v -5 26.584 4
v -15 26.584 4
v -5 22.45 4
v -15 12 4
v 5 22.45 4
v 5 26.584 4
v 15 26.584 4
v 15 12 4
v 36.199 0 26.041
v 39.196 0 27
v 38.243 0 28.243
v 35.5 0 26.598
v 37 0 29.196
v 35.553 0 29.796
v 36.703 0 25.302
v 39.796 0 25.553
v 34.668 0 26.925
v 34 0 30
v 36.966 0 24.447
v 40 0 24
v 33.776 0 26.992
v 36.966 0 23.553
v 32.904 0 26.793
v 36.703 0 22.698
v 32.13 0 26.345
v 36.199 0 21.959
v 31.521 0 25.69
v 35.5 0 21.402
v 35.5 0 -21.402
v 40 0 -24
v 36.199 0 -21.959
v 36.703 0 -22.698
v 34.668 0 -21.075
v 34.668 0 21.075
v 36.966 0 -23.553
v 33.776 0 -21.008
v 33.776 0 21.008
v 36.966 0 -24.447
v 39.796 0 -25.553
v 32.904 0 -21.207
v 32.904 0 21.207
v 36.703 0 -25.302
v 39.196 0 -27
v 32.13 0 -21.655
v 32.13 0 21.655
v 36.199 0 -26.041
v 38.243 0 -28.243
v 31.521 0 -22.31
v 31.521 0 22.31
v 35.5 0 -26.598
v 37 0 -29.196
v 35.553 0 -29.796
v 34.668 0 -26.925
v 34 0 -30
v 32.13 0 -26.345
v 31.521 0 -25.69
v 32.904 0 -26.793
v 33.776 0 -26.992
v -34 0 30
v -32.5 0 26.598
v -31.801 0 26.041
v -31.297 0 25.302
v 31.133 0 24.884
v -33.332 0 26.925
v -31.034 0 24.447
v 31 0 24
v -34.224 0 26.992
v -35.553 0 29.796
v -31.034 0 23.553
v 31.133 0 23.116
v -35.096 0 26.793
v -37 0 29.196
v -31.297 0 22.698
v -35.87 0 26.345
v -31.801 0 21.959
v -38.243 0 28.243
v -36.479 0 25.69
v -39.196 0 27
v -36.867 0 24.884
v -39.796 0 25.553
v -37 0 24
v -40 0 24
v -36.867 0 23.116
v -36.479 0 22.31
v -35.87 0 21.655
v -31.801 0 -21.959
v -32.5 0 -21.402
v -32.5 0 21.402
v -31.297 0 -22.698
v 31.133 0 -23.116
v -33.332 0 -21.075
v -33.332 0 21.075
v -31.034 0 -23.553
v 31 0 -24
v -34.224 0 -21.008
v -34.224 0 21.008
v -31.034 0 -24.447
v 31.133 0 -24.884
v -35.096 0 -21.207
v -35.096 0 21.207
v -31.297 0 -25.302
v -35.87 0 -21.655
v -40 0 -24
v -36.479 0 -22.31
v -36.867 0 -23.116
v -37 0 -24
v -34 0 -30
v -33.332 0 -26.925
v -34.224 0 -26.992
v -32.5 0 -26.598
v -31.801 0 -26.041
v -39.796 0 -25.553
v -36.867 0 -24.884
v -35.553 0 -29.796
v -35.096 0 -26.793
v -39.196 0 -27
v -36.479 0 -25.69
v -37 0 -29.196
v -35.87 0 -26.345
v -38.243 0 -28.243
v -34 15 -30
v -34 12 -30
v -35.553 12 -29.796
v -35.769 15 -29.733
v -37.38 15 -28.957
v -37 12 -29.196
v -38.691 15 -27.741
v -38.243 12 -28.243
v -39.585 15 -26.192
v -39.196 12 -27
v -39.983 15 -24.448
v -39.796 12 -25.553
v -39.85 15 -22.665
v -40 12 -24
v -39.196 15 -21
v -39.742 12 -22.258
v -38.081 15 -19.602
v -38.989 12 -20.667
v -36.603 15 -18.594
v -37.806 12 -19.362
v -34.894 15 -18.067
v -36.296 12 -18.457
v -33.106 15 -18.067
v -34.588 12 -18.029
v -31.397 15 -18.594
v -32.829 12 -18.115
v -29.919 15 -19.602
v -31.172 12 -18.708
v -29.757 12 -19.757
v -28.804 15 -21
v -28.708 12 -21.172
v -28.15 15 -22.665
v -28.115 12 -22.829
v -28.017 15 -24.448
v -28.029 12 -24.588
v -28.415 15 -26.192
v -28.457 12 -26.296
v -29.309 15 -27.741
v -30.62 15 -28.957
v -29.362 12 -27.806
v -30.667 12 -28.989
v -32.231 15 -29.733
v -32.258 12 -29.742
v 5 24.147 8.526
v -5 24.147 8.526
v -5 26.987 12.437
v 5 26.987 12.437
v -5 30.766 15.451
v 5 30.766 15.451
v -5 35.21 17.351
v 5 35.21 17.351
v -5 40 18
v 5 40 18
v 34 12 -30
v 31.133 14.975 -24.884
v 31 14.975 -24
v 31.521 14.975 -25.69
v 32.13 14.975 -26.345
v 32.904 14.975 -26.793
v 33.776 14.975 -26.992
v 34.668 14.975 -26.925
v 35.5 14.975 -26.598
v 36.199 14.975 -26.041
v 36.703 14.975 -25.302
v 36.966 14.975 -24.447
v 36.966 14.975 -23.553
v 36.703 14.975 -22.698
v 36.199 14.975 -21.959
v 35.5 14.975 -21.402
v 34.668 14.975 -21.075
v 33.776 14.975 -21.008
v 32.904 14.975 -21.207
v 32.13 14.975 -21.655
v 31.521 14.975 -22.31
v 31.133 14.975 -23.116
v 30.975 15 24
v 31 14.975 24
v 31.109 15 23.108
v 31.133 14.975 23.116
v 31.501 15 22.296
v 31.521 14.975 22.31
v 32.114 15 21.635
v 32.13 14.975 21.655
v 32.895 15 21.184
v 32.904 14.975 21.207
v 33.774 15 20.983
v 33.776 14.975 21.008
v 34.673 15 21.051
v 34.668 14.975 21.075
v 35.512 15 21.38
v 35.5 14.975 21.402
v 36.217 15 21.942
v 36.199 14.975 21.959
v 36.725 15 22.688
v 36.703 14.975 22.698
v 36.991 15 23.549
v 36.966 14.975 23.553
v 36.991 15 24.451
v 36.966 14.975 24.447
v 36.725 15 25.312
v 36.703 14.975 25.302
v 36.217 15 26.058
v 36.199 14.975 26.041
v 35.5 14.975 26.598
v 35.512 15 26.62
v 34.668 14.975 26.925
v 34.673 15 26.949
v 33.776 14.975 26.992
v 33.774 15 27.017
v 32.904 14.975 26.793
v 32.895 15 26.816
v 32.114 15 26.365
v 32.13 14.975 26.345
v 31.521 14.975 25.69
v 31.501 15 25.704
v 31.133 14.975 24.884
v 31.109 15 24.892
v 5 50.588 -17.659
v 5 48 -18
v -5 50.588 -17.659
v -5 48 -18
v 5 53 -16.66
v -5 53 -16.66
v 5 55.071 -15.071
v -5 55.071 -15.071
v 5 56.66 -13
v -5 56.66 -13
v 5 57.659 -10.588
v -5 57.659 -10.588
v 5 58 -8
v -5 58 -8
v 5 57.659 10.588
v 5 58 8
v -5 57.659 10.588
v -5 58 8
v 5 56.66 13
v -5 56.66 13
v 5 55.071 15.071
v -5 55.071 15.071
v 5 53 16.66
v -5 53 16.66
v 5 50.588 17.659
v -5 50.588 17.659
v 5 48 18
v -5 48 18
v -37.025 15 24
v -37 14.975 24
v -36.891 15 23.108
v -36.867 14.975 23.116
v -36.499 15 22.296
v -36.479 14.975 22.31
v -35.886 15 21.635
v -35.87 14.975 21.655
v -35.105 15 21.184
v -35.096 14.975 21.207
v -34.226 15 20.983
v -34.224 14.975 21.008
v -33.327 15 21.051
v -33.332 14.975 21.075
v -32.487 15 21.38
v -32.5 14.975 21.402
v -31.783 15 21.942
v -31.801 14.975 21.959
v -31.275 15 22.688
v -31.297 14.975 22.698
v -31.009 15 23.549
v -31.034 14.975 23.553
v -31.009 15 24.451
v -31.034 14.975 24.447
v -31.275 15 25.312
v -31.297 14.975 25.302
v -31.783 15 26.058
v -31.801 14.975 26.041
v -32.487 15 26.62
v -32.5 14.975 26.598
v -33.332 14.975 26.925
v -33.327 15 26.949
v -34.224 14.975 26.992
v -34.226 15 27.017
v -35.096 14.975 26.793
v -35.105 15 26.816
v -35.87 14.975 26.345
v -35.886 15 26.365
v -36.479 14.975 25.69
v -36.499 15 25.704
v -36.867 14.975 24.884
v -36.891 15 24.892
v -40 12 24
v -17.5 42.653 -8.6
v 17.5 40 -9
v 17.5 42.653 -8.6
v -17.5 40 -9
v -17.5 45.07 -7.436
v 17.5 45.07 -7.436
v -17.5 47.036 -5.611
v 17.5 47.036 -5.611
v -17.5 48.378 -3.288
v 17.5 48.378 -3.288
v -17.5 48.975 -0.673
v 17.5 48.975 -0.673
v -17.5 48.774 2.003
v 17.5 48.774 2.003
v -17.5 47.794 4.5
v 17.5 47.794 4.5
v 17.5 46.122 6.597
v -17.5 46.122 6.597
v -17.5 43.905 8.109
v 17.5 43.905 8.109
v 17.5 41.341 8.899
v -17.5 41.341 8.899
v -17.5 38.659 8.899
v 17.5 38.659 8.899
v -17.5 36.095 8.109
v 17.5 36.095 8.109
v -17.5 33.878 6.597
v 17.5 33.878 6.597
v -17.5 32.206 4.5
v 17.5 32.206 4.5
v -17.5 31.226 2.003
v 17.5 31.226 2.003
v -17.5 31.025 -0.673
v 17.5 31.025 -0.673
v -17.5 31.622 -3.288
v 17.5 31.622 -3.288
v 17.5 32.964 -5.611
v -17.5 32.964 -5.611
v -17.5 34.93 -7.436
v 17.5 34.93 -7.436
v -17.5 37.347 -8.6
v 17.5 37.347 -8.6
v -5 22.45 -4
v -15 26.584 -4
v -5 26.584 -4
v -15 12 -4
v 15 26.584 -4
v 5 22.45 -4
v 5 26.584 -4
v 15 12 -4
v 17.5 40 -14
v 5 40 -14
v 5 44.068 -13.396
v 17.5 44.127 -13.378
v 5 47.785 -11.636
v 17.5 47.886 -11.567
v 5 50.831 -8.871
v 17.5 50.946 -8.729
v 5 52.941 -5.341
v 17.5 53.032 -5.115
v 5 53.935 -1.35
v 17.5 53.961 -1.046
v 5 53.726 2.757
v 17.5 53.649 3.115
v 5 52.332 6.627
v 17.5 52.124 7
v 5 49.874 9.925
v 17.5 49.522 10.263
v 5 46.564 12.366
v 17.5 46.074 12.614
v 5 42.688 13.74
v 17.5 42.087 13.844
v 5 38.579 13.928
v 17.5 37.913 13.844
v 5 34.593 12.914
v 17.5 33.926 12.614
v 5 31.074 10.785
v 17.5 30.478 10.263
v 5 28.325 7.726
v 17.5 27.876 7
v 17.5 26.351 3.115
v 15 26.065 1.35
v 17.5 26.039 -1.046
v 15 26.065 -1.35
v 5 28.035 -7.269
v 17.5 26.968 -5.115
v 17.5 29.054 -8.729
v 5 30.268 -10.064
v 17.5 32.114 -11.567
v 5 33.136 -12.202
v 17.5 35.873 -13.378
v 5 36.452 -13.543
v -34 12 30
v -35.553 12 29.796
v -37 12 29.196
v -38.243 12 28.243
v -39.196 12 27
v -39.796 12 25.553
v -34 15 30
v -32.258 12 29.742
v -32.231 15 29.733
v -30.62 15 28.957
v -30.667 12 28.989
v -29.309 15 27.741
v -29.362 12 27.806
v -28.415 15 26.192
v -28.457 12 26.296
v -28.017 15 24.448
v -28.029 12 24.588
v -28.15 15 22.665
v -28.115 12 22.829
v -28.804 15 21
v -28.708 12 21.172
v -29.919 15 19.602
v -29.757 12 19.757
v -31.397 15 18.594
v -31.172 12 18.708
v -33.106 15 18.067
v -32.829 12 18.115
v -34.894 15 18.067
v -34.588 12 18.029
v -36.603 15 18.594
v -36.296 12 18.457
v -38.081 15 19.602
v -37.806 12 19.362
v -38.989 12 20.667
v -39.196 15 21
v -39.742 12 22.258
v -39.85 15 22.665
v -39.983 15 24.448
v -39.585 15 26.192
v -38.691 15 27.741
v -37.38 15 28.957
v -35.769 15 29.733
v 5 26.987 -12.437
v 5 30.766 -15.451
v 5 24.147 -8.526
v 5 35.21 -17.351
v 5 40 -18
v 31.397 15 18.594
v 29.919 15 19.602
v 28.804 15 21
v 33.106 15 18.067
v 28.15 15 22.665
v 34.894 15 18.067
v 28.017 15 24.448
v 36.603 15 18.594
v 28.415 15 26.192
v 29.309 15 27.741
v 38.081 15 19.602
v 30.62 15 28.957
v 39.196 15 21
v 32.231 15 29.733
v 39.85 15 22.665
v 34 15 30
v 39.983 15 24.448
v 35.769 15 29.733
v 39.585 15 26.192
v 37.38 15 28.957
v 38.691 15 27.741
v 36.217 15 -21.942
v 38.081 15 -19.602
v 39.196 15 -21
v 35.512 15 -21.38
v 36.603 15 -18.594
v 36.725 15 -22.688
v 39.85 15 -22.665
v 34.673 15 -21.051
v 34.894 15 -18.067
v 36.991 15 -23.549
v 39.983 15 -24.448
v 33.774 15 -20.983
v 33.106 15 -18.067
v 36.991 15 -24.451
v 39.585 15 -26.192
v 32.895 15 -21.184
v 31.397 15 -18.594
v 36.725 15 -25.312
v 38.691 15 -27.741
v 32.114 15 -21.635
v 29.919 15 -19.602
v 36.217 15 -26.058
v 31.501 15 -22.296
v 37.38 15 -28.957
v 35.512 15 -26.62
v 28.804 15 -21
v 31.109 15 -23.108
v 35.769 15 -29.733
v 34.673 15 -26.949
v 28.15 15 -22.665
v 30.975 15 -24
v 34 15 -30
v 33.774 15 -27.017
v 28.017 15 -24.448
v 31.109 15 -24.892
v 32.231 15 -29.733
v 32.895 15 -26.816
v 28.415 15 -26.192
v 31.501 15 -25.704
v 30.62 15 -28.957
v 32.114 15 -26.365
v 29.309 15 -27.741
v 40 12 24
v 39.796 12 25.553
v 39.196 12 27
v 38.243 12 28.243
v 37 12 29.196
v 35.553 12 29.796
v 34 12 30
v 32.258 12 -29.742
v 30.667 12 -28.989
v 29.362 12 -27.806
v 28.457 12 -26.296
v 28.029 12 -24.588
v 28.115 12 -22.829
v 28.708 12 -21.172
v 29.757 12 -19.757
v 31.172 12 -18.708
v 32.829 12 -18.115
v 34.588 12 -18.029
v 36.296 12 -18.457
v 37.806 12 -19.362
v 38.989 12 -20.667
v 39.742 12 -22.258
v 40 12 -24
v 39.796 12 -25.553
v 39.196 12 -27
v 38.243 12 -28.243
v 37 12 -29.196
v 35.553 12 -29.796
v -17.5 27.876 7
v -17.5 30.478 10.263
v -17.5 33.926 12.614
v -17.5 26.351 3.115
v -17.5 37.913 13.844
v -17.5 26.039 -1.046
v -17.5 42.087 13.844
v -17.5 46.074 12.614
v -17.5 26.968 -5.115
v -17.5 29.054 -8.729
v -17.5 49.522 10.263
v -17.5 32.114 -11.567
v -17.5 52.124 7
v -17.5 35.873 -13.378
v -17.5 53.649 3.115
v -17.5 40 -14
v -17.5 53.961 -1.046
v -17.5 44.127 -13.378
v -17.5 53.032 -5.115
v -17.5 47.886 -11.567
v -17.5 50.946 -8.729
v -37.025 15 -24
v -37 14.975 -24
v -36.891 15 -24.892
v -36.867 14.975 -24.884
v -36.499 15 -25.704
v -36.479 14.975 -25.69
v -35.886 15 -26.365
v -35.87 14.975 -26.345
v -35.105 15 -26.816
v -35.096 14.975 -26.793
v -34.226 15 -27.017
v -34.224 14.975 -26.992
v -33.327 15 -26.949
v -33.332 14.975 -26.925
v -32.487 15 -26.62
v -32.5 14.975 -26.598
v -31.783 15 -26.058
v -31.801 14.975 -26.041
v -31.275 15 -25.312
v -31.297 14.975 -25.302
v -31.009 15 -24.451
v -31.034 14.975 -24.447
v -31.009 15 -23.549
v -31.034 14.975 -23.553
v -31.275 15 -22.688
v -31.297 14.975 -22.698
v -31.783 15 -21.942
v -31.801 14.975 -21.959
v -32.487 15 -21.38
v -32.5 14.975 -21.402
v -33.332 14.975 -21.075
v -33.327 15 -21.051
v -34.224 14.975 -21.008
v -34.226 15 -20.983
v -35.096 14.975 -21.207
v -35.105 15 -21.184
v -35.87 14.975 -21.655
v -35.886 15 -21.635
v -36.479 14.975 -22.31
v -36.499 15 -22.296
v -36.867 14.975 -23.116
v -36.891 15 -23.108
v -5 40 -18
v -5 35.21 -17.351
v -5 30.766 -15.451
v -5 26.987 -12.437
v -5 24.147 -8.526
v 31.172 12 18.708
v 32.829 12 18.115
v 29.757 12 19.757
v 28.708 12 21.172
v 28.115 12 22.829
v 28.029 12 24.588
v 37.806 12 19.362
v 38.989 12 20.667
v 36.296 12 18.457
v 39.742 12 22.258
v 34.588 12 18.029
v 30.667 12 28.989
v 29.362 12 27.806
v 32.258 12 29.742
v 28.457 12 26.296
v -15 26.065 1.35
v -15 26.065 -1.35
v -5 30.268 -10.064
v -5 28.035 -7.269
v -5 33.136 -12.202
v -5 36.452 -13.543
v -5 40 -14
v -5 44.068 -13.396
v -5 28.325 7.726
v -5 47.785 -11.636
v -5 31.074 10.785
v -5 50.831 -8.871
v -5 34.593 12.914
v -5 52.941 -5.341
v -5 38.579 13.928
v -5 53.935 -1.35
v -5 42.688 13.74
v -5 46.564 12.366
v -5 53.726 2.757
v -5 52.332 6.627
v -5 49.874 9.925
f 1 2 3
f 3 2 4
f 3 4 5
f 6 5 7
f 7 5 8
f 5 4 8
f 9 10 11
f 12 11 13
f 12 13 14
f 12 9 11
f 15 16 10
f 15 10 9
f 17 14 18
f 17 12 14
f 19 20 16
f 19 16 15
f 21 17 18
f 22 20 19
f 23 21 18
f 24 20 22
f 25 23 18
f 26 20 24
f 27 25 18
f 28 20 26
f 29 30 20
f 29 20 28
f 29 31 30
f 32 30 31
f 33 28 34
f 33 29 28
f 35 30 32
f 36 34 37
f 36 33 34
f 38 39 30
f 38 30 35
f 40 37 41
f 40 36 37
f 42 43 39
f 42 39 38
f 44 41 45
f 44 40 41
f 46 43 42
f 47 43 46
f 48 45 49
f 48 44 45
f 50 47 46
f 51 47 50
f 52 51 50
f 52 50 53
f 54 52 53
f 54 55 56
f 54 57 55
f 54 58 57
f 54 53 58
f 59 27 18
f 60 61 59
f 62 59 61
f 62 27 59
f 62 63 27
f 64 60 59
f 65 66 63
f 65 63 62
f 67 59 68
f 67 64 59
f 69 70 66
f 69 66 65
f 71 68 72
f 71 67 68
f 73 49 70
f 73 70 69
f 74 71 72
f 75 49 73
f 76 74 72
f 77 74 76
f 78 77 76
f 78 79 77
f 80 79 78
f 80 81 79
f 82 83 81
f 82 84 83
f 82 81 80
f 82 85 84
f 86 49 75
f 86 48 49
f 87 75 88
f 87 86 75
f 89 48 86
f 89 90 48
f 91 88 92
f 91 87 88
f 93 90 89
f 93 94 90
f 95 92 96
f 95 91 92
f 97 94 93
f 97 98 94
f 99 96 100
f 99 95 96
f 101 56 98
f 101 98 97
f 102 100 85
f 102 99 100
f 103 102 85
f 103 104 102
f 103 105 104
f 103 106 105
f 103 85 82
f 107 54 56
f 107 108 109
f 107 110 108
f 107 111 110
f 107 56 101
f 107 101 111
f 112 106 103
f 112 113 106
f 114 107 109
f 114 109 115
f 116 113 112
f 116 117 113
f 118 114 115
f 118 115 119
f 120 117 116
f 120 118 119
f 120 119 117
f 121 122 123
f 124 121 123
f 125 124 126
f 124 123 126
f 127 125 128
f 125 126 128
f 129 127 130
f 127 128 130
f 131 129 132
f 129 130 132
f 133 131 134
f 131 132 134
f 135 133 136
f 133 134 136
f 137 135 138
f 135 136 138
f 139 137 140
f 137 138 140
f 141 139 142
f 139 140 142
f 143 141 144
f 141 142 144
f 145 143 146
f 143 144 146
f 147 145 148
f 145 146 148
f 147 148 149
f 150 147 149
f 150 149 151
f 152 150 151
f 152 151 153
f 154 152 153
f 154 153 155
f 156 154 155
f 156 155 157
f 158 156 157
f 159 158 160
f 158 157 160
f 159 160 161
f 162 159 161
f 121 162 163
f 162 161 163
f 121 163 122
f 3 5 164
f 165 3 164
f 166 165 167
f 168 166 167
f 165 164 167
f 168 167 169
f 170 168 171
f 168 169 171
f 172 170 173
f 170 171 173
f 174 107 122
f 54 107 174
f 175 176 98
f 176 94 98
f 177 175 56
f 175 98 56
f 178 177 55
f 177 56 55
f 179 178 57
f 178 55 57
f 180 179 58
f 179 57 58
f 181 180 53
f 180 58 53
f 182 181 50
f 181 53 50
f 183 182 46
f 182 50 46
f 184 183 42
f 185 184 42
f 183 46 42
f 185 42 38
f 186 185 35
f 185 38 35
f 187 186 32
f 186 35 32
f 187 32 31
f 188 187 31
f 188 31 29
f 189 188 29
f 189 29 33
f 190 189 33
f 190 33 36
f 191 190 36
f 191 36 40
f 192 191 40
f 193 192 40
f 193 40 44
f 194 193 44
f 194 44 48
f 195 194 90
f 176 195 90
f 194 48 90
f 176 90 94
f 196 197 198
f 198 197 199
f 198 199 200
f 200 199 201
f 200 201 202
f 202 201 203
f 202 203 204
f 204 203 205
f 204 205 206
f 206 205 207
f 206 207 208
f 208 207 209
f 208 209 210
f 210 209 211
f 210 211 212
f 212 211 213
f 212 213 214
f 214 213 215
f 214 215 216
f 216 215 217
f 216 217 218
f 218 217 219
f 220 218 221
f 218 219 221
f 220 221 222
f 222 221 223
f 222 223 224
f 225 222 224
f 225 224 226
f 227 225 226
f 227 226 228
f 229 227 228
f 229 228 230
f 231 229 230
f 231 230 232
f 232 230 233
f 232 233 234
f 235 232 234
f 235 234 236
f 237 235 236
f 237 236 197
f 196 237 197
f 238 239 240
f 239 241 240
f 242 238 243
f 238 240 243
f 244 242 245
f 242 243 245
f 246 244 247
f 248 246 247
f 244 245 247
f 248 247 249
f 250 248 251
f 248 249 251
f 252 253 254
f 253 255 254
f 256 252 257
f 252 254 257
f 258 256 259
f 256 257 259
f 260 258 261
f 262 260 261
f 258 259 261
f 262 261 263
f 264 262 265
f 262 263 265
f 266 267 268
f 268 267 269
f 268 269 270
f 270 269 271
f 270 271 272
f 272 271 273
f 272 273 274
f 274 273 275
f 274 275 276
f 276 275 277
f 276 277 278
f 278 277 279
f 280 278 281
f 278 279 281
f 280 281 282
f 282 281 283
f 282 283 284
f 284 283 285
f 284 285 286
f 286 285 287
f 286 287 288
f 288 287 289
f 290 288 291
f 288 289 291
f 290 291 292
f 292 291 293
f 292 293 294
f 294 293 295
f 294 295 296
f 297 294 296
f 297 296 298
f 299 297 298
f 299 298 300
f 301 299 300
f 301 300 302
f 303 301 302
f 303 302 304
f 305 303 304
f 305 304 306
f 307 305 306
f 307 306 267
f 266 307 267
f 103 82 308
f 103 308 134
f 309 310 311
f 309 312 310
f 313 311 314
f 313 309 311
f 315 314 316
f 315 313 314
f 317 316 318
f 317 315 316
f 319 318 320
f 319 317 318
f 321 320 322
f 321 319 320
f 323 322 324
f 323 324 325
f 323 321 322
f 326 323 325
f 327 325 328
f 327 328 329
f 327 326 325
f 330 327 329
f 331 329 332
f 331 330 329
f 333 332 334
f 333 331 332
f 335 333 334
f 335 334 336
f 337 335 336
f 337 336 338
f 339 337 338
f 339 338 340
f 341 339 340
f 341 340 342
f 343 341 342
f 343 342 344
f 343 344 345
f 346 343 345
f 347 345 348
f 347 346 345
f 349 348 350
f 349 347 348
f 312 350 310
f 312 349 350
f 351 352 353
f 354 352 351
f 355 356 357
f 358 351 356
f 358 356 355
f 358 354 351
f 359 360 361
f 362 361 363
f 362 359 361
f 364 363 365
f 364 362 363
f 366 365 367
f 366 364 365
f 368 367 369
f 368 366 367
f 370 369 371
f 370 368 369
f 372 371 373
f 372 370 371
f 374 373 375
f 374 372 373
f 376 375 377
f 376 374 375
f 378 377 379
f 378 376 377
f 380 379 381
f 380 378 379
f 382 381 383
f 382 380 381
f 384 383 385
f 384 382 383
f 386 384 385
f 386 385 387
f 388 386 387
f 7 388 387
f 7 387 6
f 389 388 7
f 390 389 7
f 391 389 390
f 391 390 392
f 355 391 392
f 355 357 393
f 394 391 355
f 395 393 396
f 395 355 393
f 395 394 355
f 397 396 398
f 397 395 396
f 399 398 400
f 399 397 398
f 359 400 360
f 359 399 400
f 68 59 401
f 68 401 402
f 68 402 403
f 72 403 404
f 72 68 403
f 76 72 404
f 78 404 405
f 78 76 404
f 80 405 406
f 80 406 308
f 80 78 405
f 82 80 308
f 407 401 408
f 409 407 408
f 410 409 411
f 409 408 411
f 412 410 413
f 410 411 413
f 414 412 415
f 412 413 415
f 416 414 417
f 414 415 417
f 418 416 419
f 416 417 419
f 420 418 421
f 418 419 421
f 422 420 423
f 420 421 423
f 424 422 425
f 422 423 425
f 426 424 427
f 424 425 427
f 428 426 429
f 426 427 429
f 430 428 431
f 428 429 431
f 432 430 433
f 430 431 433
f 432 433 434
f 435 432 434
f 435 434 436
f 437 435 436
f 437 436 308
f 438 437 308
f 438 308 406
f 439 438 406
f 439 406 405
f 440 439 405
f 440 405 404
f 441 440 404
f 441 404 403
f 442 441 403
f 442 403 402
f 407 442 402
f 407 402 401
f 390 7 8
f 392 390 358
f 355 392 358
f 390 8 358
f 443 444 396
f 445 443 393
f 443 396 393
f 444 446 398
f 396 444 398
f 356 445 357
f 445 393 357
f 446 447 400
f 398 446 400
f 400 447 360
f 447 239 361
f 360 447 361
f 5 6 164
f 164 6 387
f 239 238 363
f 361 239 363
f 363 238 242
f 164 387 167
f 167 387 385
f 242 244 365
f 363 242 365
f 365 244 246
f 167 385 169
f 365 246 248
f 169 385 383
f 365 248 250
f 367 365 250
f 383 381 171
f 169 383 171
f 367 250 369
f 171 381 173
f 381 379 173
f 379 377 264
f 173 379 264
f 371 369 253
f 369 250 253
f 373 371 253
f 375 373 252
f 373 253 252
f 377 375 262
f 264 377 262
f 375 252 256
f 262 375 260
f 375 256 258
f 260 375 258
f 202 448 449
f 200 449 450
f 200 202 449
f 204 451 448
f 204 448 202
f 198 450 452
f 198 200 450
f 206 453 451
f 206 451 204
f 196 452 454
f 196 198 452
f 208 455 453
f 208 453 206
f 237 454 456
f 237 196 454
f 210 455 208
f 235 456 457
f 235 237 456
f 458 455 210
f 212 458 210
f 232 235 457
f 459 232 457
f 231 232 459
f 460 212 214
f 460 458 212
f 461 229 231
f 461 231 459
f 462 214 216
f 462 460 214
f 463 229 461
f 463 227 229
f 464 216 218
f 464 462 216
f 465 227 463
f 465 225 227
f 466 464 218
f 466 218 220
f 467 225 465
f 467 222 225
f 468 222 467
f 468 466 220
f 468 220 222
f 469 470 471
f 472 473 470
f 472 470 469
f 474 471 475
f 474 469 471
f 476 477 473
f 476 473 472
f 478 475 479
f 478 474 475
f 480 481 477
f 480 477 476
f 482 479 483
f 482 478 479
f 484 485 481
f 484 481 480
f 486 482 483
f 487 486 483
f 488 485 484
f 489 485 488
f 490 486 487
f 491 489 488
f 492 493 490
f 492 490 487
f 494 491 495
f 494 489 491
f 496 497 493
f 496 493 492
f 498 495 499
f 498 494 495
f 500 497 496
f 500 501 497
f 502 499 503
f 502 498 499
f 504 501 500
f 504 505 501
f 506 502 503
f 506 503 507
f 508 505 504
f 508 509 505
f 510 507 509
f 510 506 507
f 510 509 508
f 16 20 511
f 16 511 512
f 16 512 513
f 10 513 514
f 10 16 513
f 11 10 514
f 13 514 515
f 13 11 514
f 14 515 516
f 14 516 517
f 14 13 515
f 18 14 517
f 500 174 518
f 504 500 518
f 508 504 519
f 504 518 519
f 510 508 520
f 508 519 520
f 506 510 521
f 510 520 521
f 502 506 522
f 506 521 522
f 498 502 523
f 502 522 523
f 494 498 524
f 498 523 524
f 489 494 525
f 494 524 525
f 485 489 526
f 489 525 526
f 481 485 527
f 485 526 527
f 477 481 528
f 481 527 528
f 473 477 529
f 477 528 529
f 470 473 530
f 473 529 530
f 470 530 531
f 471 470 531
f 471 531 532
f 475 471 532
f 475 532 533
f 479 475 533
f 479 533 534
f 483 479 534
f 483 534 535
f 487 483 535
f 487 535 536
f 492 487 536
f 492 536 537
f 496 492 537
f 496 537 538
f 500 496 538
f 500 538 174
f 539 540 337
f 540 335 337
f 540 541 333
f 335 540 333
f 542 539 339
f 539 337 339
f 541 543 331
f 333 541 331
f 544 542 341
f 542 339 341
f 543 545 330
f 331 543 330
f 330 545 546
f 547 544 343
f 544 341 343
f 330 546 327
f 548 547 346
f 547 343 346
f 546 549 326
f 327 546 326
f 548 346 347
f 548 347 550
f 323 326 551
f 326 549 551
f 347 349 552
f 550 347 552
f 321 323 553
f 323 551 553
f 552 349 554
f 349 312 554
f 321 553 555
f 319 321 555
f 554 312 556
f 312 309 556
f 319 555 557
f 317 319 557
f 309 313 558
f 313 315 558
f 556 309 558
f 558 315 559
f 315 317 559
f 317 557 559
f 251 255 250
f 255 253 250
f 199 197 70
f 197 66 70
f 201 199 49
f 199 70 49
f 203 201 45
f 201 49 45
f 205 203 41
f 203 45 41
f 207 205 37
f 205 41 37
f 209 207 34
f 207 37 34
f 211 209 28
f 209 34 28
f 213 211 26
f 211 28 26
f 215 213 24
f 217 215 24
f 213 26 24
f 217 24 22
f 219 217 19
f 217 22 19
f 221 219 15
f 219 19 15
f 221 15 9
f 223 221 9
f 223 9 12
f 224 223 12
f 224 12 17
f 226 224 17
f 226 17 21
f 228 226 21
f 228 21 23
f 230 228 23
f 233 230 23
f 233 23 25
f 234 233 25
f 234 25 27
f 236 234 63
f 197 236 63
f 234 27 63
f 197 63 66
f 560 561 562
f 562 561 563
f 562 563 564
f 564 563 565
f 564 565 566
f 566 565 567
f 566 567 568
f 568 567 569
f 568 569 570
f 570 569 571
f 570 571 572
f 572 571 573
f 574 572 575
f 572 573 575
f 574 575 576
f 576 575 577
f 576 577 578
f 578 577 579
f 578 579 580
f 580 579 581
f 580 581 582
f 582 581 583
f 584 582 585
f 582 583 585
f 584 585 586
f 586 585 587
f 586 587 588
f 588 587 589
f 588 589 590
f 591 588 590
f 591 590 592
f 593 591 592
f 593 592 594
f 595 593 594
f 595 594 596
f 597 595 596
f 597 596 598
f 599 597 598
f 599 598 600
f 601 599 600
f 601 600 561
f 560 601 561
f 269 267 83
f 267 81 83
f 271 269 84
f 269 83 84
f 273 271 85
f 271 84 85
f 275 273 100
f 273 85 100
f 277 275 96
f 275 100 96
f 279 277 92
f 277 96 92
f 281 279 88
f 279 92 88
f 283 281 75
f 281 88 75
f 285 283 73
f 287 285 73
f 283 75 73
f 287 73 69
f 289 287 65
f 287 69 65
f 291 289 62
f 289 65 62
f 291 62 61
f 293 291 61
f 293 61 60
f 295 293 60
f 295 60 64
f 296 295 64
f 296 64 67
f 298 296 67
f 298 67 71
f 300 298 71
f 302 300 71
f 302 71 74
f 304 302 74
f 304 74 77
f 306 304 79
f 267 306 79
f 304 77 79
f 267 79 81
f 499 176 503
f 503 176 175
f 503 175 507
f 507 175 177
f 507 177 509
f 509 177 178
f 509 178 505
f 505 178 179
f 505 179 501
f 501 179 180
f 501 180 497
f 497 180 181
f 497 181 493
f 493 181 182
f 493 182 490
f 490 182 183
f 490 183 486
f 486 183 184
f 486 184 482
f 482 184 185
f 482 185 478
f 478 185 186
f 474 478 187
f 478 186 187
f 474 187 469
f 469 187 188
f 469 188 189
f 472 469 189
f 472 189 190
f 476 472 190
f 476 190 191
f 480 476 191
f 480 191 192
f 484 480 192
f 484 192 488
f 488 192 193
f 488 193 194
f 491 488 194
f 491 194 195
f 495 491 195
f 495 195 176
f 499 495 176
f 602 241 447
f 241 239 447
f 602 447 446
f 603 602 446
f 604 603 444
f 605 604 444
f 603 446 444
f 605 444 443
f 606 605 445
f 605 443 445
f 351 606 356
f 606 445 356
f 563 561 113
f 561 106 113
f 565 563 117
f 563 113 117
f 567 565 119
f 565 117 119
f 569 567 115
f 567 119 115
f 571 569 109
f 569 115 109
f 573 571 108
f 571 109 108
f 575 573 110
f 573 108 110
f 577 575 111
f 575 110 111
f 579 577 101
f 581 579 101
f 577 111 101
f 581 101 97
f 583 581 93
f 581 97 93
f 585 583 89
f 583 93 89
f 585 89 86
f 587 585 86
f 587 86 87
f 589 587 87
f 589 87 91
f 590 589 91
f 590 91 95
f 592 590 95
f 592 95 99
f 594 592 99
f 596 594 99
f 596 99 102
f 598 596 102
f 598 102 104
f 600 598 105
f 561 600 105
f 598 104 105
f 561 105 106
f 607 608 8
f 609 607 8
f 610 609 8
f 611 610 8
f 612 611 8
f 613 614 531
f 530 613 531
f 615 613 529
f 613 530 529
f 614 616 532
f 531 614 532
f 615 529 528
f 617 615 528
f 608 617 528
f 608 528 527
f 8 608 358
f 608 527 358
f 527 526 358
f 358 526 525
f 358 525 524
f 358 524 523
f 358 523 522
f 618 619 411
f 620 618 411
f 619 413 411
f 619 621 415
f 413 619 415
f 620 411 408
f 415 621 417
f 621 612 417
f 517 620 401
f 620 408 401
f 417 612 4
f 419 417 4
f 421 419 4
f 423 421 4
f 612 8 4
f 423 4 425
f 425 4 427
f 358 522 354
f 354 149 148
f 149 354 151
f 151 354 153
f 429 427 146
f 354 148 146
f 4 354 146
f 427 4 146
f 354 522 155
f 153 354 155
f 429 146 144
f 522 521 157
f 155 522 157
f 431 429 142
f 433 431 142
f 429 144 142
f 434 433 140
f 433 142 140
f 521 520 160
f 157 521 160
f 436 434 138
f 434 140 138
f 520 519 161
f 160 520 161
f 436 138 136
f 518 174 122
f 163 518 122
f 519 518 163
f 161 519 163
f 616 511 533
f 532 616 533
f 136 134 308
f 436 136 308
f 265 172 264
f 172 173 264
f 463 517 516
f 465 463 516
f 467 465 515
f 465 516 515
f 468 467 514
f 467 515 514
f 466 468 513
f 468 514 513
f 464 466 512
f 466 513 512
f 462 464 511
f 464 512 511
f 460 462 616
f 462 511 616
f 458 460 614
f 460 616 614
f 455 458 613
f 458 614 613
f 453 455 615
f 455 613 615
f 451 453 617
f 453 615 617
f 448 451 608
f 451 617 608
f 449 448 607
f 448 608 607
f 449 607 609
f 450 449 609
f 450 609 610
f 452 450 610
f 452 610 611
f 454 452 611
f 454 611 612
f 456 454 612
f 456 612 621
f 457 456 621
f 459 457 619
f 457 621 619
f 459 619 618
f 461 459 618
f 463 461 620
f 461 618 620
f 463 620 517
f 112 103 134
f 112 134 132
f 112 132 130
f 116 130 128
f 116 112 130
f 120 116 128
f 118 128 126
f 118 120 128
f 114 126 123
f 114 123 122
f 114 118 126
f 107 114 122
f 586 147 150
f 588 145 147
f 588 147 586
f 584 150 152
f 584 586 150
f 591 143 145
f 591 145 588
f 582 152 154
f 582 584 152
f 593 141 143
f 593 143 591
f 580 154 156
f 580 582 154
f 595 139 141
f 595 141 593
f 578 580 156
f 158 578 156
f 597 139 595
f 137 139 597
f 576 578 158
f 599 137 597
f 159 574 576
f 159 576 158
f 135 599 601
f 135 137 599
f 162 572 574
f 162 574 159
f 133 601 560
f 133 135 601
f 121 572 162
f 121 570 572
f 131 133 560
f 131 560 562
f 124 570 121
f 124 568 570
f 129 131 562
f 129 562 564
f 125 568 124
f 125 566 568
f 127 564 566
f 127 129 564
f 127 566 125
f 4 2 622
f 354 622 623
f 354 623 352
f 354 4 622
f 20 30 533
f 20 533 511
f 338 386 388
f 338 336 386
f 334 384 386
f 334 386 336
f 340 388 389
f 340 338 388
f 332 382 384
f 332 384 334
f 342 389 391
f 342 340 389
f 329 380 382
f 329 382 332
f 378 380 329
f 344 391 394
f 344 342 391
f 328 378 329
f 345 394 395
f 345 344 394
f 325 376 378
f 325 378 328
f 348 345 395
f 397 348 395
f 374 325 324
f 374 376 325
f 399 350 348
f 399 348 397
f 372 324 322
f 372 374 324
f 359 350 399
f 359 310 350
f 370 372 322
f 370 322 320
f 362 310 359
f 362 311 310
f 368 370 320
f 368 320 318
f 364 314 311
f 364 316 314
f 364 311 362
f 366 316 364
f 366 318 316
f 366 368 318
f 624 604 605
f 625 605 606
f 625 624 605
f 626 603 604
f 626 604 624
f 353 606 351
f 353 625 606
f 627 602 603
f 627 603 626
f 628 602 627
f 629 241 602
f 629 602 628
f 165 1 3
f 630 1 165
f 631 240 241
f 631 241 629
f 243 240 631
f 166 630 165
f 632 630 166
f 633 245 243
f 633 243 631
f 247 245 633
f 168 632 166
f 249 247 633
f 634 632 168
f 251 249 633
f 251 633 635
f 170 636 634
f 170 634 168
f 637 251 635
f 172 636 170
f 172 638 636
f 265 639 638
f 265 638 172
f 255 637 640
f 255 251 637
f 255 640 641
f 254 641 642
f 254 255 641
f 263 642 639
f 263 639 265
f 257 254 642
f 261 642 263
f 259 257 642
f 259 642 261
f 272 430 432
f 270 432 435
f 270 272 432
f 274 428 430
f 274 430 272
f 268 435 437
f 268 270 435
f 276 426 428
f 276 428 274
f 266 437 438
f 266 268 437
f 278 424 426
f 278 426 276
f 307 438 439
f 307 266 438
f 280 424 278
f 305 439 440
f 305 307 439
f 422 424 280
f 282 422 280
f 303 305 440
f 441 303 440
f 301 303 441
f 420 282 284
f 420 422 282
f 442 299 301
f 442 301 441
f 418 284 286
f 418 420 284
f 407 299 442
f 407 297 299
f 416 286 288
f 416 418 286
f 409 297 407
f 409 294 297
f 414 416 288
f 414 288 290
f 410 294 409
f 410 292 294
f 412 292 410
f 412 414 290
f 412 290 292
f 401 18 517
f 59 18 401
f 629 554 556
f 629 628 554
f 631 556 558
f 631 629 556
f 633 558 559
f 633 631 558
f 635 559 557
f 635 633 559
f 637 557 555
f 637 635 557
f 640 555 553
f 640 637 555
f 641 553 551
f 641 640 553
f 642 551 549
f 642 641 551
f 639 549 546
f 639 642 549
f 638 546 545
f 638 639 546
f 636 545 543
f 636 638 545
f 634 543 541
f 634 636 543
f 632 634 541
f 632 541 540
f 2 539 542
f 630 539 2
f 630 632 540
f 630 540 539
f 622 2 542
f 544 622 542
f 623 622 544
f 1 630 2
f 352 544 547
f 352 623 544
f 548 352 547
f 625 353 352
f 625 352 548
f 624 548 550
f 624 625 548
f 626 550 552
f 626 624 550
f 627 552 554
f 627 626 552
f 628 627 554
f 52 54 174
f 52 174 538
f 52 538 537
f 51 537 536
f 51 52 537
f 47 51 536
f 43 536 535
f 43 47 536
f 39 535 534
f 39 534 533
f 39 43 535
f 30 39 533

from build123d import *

# Parameters (mm, degrees)
BOSS_EXTRUDE1_DEPTH                = 12
SKETCH2_R                          = 6
BOSS_EXTRUDE2_DEPTH                = 3
F_6_0_6_DIAMETER_HOLE2_D           = 6
F_6_0_6_DIAMETER_HOLE2_CSINK_D     = 6.05
F_6_0_6_DIAMETER_HOLE2_CSINK_ANGLE = 90
SKETCH7_R                          = 14
SKETCH7_R_2                        = 9
BOSS_EXTRUDE4_DEPTH                = 17.5
BOSS_EXTRUDE6_DEPTH                = 5
SKETCH9_R                          = 9
CUT_EXTRUDE1_DEPTH                 = 30
BOSS_EXTRUDE7_REACH                = 69.941
SKETCH10_W                         = 30
SKETCH10_H                         = 8
FILLET1_R                          = 10


with BuildPart() as part:
    # Sketch1 → Boss-Extrude1 (new body)
    with BuildSketch(Plane(origin=(0, 0, 0), x_dir=(1, 0, 0), z_dir=(0, 1, 0))):
        with BuildLine():
            Line((-34, 30), (34, 30))
            ThreePointArc((34, 30), (38.242640687, 28.242640687), (40, 24))
            Line((40, 24), (40, -24))
            ThreePointArc((40, -24), (38.242640687, -28.242640687), (34, -30))
            Line((34, -30), (-34, -30))
            ThreePointArc((-34, -30), (-38.242640687, -28.242640687), (-40, -24))
            Line((-40, -24), (-40, 24))
            ThreePointArc((-40, 24), (-38.242640687, 28.242640687), (-34, 30))
        make_face()
    extrude(amount=BOSS_EXTRUDE1_DEPTH)

    # Sketch2 → Boss-Extrude2 (add)
    with BuildSketch(Plane(origin=(0, 12, 0), x_dir=(1, 0, 0), z_dir=(0, 1, 0))):
        with Locations(Location((-34, 24, 0), (0, 0, 90))):
            Circle(SKETCH2_R)
        with Locations(Location((-34, -24, 0), (0, 0, 270))):
            Circle(SKETCH2_R)
        with Locations(Location((34, 24, 0), (0, 0, 90))):
            Circle(SKETCH2_R)
        with Locations(Location((34, -24, 0), (0, 0, 270))):
            Circle(SKETCH2_R)
    extrude(amount=BOSS_EXTRUDE2_DEPTH)

    # Ø6.0 (6) Diameter Hole2 (through all)
    with Locations(Plane(origin=(0, 15, 0), x_dir=(1, 0, 0), z_dir=(0, 1, 0))):
        with Locations((-34, 24), (34, 24), (34, -24), (-34, -24)):
            CounterSinkHole(F_6_0_6_DIAMETER_HOLE2_D / 2, F_6_0_6_DIAMETER_HOLE2_CSINK_D / 2, counter_sink_angle=F_6_0_6_DIAMETER_HOLE2_CSINK_ANGLE)


with BuildPart() as body_2:
    # Sketch7 → Boss-Extrude4 (new, symmetric)
    with BuildSketch(Plane(origin=(0, 0, 0), x_dir=(0, 0, -1), z_dir=(1, 0, 0))):
        with Locations((0, 40)):
            Circle(SKETCH7_R)
        with Locations((0, 40)):
            Circle(SKETCH7_R_2, mode=Mode.SUBTRACT)
    extrude(amount=BOSS_EXTRUDE4_DEPTH, both=True)

    # Sketch8 → Boss-Extrude6 (add, symmetric)
    with BuildSketch(Plane(origin=(0, 0, 0), x_dir=(0, 0, -1), z_dir=(1, 0, 0))):
        with BuildLine():
            Line((-18, 40), (-18, 58))
            Line((-18, 58), (18, 58))
            Line((18, 58), (18, 40))
            ThreePointArc((18, 40), (0, 22), (-18, 40))
        make_face()
    extrude(amount=BOSS_EXTRUDE6_DEPTH, both=True)

    # Sketch9 → Cut-Extrude1 (cut, symmetric)
    with BuildSketch(Plane(origin=(5, 0, 0), x_dir=(0, 0, -1), z_dir=(1, 0, 0))):
        with Locations((0, 40)):
            Circle(SKETCH9_R)
    extrude(amount=CUT_EXTRUDE1_DEPTH, both=True, mode=Mode.SUBTRACT)

    # Sketch10 → Boss-Extrude7 (add, up to next)
    with BuildSketch(Plane(origin=(0, 12, 0), x_dir=(1, 0, 0), z_dir=(0, 1, 0)), mode=Mode.PRIVATE) as boss_extrude7_sk1:
        Rectangle(SKETCH10_W, SKETCH10_H)
    boss_extrude7_tool1 = extrude(boss_extrude7_sk1.sketch, amount=BOSS_EXTRUDE7_REACH, mode=Mode.PRIVATE) - body_2.part

    add(part.part)  # Boss-Extrude7 merges part
    add(boss_extrude7_tool1.solids().sort_by_distance((0, 12, 0))[0])

    # Fillet1
    fillet1_edges = [body_2.edges().sort_by_distance(p)[0] for p in [
        (0, 58, 18),
        (0, 58, -18),
    ]]
    fillet(fillet1_edges, radius=FILLET1_R)


solid = body_2.part
